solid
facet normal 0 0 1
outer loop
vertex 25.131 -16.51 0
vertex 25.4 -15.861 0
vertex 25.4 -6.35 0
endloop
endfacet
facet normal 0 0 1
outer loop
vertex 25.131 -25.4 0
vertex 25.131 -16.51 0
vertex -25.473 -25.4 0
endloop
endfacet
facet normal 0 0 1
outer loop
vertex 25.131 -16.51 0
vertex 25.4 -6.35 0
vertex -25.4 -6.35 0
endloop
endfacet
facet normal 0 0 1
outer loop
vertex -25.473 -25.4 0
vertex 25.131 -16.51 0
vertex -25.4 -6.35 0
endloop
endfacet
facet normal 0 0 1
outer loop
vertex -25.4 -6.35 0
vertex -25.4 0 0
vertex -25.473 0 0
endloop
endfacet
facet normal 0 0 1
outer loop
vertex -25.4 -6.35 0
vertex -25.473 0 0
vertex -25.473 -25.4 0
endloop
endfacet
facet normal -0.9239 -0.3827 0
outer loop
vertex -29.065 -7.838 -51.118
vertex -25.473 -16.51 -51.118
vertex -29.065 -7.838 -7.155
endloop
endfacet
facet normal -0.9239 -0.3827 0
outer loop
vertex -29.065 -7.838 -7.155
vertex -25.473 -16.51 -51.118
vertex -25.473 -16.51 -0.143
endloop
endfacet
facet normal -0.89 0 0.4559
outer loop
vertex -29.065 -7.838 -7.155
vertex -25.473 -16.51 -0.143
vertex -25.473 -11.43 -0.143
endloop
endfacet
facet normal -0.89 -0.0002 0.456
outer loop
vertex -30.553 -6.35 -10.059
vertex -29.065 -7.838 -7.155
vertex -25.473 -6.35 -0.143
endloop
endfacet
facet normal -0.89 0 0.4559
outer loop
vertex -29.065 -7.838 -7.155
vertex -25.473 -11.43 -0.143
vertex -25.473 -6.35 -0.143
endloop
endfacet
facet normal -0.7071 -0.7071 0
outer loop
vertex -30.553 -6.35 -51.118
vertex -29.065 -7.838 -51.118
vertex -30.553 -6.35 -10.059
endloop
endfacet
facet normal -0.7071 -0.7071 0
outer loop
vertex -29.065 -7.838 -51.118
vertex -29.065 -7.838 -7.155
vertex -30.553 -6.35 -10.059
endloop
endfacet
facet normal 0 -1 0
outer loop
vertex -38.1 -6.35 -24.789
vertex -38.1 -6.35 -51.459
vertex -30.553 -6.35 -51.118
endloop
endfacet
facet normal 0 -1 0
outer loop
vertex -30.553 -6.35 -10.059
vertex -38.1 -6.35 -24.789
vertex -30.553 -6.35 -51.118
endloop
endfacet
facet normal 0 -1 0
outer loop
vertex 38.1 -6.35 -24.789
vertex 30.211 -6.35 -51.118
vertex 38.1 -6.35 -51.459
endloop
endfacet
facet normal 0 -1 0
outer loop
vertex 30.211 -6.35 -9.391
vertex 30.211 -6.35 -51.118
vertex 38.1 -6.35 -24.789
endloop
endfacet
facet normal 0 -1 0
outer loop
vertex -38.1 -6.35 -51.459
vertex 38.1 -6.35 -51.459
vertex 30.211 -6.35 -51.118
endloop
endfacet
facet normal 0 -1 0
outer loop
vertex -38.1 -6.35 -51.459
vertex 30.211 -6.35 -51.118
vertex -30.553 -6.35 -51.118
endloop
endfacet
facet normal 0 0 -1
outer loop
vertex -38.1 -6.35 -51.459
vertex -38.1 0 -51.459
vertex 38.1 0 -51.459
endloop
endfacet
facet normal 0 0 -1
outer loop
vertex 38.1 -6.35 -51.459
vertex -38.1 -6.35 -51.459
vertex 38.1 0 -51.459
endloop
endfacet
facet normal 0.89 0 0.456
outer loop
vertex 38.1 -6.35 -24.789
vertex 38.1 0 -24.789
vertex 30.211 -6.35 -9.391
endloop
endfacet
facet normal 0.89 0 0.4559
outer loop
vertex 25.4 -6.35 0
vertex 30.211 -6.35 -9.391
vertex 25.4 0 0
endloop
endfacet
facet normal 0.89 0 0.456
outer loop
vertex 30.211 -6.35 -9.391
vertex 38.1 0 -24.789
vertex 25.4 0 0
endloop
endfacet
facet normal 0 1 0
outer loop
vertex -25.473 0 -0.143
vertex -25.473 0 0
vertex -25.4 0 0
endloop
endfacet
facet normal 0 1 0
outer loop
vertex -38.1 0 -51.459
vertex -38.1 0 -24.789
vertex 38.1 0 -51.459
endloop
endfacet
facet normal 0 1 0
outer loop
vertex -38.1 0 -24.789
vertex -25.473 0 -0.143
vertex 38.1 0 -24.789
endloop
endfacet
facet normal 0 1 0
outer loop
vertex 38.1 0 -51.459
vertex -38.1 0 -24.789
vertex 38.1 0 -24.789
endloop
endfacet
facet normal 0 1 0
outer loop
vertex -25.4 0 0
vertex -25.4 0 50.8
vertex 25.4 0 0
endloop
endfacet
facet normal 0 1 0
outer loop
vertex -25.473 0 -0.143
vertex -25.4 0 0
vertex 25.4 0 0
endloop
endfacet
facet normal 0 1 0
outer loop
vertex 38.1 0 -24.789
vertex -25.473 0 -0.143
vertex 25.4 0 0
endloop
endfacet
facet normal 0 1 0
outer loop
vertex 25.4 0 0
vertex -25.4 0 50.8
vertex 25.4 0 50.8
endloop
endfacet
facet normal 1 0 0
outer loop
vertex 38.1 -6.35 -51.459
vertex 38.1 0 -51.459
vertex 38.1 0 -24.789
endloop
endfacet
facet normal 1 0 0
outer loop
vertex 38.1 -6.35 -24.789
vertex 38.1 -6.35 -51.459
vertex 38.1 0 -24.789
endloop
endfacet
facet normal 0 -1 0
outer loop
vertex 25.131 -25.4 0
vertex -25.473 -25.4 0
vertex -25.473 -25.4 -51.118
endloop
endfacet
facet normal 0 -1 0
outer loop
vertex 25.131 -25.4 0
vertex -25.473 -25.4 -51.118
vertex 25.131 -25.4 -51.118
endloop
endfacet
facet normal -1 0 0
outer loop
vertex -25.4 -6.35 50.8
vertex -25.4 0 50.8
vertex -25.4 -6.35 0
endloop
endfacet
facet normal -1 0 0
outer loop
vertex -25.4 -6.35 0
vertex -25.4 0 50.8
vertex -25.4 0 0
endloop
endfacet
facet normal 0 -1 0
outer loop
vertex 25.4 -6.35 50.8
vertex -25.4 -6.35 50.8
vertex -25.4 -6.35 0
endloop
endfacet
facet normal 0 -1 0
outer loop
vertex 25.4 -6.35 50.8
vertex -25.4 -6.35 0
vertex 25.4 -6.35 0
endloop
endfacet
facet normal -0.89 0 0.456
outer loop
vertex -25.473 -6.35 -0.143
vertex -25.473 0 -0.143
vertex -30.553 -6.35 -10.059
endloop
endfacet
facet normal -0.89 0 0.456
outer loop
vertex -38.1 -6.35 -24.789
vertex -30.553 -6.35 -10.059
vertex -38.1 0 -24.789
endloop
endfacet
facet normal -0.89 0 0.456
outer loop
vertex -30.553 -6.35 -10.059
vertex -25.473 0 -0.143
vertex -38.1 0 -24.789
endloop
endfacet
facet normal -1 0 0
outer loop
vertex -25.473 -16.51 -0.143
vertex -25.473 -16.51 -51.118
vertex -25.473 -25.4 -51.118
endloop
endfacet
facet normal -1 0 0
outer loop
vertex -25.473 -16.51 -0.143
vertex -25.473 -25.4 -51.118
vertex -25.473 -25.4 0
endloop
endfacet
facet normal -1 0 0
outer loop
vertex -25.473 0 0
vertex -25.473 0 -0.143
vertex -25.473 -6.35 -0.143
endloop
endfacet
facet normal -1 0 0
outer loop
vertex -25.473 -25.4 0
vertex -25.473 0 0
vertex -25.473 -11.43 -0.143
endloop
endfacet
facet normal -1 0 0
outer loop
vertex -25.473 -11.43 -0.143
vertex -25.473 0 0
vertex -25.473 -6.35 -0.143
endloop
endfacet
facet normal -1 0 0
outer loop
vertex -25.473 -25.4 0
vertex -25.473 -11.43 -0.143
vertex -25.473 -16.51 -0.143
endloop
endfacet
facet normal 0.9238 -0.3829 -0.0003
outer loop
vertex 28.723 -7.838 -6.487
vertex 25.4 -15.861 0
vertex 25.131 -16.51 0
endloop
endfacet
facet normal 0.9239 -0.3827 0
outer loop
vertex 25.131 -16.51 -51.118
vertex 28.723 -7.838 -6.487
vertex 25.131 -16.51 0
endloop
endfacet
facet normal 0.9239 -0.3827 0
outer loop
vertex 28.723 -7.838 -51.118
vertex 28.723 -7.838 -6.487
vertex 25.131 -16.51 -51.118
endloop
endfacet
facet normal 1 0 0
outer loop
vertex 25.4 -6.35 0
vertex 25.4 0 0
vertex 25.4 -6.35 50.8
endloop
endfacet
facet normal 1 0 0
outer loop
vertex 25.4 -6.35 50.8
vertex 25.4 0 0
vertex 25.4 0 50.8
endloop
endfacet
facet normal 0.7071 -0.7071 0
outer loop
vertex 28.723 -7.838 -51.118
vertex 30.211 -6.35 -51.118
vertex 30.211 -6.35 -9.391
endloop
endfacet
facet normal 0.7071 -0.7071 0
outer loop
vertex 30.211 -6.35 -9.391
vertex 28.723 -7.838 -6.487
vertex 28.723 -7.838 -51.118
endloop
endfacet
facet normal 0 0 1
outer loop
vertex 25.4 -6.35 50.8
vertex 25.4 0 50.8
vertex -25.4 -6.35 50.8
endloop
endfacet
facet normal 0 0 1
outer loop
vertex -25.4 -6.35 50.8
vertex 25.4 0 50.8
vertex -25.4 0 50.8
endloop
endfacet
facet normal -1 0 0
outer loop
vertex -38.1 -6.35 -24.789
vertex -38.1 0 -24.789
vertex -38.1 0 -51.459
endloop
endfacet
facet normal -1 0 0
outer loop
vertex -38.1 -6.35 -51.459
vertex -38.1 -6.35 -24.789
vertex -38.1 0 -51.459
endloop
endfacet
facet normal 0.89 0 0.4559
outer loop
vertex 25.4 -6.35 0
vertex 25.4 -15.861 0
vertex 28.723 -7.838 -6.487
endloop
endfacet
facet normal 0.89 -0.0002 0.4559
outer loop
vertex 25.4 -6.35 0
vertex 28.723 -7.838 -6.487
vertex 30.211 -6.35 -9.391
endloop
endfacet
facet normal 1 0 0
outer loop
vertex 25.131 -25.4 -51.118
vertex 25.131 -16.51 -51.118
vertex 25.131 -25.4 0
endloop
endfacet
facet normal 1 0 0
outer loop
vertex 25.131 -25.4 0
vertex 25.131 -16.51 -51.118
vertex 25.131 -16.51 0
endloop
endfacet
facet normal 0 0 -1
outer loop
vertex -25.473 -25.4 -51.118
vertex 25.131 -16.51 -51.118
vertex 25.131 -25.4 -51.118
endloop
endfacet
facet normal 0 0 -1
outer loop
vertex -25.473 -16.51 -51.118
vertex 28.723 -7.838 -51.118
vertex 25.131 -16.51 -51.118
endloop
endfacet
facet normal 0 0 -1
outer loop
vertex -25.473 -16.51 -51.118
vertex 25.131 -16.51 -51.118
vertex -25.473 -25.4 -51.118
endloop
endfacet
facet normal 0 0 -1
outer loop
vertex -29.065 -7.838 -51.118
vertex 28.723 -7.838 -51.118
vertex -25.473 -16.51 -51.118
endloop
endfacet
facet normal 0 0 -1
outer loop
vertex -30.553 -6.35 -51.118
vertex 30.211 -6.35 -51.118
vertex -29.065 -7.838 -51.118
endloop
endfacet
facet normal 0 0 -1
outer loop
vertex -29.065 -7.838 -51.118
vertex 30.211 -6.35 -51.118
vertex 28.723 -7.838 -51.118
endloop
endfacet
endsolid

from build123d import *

# Parameters (mm, degrees)
F0_W        = 50.8
F0_H        = 26.0105735242
F1_DEPTH    = 6.35
F2_W        = 50.6046172231
F2_H        = 51.1175021529
F3_DEPTH    = 25.4
F4_T4_DEPTH = 51.1175021529
F4_T9_DEPTH = 64.038633205
F5_SIZE     = 5.08


# Not quite as in the source:
# - a fillet or chamfer that OpenCascade refuses, or shapes differently, is made with other operations: its cross-section is extruded or revolved along the edge and cut away or added


with BuildPart() as f1:
    # F0 (on Front) → F1 (new body)
    with BuildSketch(Plane.XZ):
        with Locations((0, -37.7947132379)):
            Rectangle(F0_W, F0_H)
        Polygon((-38.1, -24.7894264758), (-25.4, -24.7894264758), (-25.4, 0), align=None)
        Polygon((25.4, -50.8), (-25.4, -50.8), (-25.4, -24.7894264758), (-38.1, -24.7894264758), (-38.1, -51.4594204724), (38.1, -51.4594204724), (38.1, -24.7894264758), (25.4, -24.7894264758), align=None)
        Polygon((25.4, 0), (25.4, -24.7894264758), (38.1, -24.7894264758), align=None)
        Polygon((-25.4, 0), (-25.4, -24.7894264758), (25.4, -24.7894264758), (25.4, 0), (25.4, 50.8), (-25.4, 50.8), align=None)
    extrude(amount=F1_DEPTH)

    # F2 (on Front) → F3 (join)
    with BuildSketch(Plane.XZ):
        with Locations((-0.1709619537, -25.5587510765)):
            Rectangle(F2_W, F2_H)
    extrude(amount=F3_DEPTH)

    # F4: chamfer of 5.08 on 2 edges, made by hand


with BuildPart() as f4_tool2:
    # F4_s3 → F4_t4 (new body)
    with BuildSketch(Plane.XY):
        Polygon((30.2113466579, -6.35), (25.1313466579, -11.43), (25.1313466579, -6.35), align=None)
    extrude(amount=-F4_T4_DEPTH)

    split(bisect_by=Plane(origin=(20.1193399264, 0, 10.3074436722), x_dir=(0, 1, 0), z_dir=(-0.8899999984, 0, -0.4559605278)), keep=Keep.TOP)


with BuildPart() as f1_1:
    add(f1.part)

    # F4_t1: union F4_tool2
    add(f4_tool2.part)


with BuildPart() as f4_tool7:
    # F4_s8 → F4_t9 (new body)
    with BuildSketch(Plane.XY.offset(-51.1175021529)):
        Polygon((-25.4732705653, -11.43), (-30.5532705653, -6.35), (-25.4732705653, -6.35), align=None)
    extrude(amount=F4_T9_DEPTH)

    split(bisect_by=Plane(origin=(-20.1193399264, 0, 10.3074436722), x_dir=(0, 1, 0), z_dir=(0.8899999984, 0, -0.4559605278)), keep=Keep.TOP)


with BuildPart() as f1_2:
    add(f1_1.part)

    # F4_t6: union F4_tool7
    add(f4_tool7.part)

    # F5
    f5_edges = [f1_2.edges().sort_by_distance(p)[0] for p in [
        (25.131347, -11.43, -25.558751),
        (-25.473271, -11.43, -25.63026),
    ]]
    chamfer(f5_edges, length=F5_SIZE)


solid = f1_2.part
